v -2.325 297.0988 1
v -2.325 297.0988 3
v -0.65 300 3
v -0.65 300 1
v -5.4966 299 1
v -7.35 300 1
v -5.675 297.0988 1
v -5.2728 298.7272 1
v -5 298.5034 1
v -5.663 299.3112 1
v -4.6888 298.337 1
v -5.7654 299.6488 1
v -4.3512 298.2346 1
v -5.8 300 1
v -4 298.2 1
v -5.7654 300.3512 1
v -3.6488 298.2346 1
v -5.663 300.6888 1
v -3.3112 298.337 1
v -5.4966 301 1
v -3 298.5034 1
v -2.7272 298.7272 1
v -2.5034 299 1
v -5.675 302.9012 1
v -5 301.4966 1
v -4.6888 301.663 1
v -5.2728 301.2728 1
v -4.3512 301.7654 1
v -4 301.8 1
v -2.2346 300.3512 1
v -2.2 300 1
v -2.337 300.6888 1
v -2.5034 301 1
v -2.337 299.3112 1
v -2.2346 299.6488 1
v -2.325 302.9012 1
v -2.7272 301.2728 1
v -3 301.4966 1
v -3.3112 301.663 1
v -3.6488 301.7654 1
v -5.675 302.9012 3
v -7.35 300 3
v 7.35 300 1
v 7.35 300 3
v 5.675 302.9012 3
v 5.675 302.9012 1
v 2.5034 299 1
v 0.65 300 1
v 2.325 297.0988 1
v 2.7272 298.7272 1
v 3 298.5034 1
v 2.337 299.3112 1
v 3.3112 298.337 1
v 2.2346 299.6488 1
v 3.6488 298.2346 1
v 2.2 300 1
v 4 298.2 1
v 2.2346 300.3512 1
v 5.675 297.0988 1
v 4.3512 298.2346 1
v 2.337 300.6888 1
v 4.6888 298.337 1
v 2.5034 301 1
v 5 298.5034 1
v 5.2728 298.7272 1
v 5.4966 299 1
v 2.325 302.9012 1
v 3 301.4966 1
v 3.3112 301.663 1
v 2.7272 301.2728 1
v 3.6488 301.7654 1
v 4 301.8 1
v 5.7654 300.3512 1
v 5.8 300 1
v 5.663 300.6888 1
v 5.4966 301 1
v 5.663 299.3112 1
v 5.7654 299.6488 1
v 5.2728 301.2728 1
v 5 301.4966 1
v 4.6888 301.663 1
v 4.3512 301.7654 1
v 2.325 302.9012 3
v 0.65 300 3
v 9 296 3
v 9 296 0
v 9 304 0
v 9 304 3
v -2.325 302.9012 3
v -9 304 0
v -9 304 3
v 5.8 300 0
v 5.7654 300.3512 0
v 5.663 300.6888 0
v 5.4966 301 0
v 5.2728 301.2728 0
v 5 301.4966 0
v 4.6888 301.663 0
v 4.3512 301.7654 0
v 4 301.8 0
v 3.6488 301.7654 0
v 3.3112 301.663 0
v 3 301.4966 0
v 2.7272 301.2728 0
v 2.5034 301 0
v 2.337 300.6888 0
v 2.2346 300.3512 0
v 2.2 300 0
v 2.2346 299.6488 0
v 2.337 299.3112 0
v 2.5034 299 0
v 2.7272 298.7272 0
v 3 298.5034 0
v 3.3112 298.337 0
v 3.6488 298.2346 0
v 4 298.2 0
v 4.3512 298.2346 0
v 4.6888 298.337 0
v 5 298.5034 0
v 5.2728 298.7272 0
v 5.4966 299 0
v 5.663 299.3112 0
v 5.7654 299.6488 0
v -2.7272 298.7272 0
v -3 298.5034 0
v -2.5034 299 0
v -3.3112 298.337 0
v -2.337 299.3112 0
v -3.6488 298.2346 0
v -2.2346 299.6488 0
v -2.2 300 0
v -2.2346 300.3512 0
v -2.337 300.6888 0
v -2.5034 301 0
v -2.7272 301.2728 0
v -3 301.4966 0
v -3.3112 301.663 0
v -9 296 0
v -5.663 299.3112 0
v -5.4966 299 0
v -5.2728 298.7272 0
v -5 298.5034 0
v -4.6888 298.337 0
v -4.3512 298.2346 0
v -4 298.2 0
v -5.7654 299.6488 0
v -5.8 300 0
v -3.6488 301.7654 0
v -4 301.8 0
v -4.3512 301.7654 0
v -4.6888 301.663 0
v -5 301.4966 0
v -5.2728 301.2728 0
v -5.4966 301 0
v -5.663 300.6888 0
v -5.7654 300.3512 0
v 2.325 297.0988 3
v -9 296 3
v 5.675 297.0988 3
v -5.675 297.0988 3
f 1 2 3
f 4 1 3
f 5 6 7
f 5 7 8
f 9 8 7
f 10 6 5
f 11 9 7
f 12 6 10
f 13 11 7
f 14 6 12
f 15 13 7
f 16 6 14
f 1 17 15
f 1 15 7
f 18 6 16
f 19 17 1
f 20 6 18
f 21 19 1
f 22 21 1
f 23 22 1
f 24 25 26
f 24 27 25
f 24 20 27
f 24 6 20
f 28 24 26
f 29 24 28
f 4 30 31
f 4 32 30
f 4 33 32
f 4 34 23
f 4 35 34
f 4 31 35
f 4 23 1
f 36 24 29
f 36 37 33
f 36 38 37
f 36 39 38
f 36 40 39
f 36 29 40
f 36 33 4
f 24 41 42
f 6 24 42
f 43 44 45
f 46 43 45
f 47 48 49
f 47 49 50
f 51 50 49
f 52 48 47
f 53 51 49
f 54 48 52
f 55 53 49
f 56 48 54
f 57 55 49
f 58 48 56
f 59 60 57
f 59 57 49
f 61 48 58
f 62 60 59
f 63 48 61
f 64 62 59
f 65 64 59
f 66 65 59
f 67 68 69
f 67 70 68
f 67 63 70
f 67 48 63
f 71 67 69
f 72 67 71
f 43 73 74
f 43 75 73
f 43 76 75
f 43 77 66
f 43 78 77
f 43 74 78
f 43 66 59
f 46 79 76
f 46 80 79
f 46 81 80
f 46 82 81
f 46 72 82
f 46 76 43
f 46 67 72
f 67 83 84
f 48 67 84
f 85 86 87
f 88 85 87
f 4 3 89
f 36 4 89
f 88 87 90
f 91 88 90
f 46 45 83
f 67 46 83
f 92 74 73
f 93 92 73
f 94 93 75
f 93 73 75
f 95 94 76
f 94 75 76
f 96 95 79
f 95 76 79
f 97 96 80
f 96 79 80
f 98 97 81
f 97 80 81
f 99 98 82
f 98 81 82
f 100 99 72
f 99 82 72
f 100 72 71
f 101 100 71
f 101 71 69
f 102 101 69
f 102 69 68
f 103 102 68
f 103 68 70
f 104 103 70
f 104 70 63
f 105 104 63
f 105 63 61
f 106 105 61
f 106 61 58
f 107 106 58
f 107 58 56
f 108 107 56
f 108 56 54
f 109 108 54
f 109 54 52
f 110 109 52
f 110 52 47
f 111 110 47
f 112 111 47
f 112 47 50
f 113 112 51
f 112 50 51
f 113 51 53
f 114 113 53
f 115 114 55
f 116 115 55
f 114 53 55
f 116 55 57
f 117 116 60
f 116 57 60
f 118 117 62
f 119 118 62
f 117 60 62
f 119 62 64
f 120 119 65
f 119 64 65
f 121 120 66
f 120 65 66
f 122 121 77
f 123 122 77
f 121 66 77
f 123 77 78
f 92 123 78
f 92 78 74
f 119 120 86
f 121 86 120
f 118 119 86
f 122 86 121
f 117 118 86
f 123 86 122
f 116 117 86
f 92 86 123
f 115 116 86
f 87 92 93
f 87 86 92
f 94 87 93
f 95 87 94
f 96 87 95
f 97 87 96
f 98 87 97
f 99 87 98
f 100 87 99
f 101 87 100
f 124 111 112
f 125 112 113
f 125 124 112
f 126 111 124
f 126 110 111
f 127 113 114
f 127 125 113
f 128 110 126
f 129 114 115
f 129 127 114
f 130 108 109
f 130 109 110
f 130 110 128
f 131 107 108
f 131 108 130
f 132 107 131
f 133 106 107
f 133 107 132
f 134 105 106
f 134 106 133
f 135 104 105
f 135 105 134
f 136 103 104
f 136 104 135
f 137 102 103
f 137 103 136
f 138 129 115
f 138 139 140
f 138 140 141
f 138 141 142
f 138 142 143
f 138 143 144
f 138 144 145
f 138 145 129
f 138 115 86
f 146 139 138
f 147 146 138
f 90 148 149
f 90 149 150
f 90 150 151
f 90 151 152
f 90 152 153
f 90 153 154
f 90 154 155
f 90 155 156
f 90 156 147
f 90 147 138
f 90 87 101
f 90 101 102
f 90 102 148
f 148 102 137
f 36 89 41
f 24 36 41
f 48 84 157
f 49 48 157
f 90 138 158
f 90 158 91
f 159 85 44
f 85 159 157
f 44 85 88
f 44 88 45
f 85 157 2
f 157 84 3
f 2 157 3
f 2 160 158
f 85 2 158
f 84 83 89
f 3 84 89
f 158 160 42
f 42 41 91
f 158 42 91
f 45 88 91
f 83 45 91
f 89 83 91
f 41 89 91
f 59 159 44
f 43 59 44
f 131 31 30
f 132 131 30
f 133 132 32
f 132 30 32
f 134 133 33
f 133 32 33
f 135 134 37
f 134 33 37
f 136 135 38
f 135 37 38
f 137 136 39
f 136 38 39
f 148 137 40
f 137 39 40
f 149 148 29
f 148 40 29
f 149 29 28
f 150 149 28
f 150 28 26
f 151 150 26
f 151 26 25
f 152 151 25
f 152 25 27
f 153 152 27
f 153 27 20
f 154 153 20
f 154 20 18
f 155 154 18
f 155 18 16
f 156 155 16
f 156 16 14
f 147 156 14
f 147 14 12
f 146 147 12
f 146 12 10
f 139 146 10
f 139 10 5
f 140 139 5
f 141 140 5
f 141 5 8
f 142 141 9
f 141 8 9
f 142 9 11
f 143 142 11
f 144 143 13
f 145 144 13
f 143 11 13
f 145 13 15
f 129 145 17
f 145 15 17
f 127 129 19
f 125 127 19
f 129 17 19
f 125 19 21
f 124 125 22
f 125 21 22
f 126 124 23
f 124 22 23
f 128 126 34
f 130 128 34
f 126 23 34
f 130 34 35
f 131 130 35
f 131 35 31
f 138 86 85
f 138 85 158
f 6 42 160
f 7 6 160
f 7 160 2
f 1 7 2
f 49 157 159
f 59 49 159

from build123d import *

# Parameters (mm, degrees)
SKETCH_1_W                  = 18
SKETCH_1_H                  = 8
EXTRUDE_1_DEPTH             = 3
CUT_EXTRUDE_1_DEPTH         = 2
CUT_EXTRUDE_2_DEPTH         = 2
HOLE_WIZARD_3_6_3_6_1_D     = 3.6
HOLE_WIZARD_3_6_3_6_1_DEPTH = 3


with BuildPart() as part:
    # 草图1 → 凸台-拉伸1 (new body)
    with BuildSketch(Plane(origin=(0, 0, 0), x_dir=(-1, 0, 0), z_dir=(0, 0, -1))):
        with Locations((0, 300)):
            Rectangle(SKETCH_1_W, SKETCH_1_H)
    extrude(amount=-EXTRUDE_1_DEPTH)

    # 草图2 → 切除-拉伸1 (cut)
    with BuildSketch(Plane.XY.offset(3)):
        Polygon((-0.65, 300), (-2.325, 302.901185103), (-5.675, 302.901185103), (-7.35, 300), (-5.675, 297.098814897), (-2.325, 297.098814897), align=None)
    extrude(amount=-CUT_EXTRUDE_1_DEPTH, mode=Mode.SUBTRACT)

    # 草图3 → 切除-拉伸2 (cut)
    with BuildSketch(Plane.XY.offset(3)):
        Polygon((5.675, 297.098814897), (7.35, 300), (5.675, 302.901185103), (2.325, 302.901185103), (0.65, 300), (2.325, 297.098814897), align=None)
    extrude(amount=-CUT_EXTRUDE_2_DEPTH, mode=Mode.SUBTRACT)

    # Ø3.6 (3.6) 直径孔1
    with Locations(Plane(origin=(0, 0, 0), x_dir=(-1, 0, 0), z_dir=(0, 0, -1))):
        with Locations((-4, 300), (4, 300)):
            Hole(HOLE_WIZARD_3_6_3_6_1_D / 2, depth=HOLE_WIZARD_3_6_3_6_1_DEPTH)


solid = part.part
